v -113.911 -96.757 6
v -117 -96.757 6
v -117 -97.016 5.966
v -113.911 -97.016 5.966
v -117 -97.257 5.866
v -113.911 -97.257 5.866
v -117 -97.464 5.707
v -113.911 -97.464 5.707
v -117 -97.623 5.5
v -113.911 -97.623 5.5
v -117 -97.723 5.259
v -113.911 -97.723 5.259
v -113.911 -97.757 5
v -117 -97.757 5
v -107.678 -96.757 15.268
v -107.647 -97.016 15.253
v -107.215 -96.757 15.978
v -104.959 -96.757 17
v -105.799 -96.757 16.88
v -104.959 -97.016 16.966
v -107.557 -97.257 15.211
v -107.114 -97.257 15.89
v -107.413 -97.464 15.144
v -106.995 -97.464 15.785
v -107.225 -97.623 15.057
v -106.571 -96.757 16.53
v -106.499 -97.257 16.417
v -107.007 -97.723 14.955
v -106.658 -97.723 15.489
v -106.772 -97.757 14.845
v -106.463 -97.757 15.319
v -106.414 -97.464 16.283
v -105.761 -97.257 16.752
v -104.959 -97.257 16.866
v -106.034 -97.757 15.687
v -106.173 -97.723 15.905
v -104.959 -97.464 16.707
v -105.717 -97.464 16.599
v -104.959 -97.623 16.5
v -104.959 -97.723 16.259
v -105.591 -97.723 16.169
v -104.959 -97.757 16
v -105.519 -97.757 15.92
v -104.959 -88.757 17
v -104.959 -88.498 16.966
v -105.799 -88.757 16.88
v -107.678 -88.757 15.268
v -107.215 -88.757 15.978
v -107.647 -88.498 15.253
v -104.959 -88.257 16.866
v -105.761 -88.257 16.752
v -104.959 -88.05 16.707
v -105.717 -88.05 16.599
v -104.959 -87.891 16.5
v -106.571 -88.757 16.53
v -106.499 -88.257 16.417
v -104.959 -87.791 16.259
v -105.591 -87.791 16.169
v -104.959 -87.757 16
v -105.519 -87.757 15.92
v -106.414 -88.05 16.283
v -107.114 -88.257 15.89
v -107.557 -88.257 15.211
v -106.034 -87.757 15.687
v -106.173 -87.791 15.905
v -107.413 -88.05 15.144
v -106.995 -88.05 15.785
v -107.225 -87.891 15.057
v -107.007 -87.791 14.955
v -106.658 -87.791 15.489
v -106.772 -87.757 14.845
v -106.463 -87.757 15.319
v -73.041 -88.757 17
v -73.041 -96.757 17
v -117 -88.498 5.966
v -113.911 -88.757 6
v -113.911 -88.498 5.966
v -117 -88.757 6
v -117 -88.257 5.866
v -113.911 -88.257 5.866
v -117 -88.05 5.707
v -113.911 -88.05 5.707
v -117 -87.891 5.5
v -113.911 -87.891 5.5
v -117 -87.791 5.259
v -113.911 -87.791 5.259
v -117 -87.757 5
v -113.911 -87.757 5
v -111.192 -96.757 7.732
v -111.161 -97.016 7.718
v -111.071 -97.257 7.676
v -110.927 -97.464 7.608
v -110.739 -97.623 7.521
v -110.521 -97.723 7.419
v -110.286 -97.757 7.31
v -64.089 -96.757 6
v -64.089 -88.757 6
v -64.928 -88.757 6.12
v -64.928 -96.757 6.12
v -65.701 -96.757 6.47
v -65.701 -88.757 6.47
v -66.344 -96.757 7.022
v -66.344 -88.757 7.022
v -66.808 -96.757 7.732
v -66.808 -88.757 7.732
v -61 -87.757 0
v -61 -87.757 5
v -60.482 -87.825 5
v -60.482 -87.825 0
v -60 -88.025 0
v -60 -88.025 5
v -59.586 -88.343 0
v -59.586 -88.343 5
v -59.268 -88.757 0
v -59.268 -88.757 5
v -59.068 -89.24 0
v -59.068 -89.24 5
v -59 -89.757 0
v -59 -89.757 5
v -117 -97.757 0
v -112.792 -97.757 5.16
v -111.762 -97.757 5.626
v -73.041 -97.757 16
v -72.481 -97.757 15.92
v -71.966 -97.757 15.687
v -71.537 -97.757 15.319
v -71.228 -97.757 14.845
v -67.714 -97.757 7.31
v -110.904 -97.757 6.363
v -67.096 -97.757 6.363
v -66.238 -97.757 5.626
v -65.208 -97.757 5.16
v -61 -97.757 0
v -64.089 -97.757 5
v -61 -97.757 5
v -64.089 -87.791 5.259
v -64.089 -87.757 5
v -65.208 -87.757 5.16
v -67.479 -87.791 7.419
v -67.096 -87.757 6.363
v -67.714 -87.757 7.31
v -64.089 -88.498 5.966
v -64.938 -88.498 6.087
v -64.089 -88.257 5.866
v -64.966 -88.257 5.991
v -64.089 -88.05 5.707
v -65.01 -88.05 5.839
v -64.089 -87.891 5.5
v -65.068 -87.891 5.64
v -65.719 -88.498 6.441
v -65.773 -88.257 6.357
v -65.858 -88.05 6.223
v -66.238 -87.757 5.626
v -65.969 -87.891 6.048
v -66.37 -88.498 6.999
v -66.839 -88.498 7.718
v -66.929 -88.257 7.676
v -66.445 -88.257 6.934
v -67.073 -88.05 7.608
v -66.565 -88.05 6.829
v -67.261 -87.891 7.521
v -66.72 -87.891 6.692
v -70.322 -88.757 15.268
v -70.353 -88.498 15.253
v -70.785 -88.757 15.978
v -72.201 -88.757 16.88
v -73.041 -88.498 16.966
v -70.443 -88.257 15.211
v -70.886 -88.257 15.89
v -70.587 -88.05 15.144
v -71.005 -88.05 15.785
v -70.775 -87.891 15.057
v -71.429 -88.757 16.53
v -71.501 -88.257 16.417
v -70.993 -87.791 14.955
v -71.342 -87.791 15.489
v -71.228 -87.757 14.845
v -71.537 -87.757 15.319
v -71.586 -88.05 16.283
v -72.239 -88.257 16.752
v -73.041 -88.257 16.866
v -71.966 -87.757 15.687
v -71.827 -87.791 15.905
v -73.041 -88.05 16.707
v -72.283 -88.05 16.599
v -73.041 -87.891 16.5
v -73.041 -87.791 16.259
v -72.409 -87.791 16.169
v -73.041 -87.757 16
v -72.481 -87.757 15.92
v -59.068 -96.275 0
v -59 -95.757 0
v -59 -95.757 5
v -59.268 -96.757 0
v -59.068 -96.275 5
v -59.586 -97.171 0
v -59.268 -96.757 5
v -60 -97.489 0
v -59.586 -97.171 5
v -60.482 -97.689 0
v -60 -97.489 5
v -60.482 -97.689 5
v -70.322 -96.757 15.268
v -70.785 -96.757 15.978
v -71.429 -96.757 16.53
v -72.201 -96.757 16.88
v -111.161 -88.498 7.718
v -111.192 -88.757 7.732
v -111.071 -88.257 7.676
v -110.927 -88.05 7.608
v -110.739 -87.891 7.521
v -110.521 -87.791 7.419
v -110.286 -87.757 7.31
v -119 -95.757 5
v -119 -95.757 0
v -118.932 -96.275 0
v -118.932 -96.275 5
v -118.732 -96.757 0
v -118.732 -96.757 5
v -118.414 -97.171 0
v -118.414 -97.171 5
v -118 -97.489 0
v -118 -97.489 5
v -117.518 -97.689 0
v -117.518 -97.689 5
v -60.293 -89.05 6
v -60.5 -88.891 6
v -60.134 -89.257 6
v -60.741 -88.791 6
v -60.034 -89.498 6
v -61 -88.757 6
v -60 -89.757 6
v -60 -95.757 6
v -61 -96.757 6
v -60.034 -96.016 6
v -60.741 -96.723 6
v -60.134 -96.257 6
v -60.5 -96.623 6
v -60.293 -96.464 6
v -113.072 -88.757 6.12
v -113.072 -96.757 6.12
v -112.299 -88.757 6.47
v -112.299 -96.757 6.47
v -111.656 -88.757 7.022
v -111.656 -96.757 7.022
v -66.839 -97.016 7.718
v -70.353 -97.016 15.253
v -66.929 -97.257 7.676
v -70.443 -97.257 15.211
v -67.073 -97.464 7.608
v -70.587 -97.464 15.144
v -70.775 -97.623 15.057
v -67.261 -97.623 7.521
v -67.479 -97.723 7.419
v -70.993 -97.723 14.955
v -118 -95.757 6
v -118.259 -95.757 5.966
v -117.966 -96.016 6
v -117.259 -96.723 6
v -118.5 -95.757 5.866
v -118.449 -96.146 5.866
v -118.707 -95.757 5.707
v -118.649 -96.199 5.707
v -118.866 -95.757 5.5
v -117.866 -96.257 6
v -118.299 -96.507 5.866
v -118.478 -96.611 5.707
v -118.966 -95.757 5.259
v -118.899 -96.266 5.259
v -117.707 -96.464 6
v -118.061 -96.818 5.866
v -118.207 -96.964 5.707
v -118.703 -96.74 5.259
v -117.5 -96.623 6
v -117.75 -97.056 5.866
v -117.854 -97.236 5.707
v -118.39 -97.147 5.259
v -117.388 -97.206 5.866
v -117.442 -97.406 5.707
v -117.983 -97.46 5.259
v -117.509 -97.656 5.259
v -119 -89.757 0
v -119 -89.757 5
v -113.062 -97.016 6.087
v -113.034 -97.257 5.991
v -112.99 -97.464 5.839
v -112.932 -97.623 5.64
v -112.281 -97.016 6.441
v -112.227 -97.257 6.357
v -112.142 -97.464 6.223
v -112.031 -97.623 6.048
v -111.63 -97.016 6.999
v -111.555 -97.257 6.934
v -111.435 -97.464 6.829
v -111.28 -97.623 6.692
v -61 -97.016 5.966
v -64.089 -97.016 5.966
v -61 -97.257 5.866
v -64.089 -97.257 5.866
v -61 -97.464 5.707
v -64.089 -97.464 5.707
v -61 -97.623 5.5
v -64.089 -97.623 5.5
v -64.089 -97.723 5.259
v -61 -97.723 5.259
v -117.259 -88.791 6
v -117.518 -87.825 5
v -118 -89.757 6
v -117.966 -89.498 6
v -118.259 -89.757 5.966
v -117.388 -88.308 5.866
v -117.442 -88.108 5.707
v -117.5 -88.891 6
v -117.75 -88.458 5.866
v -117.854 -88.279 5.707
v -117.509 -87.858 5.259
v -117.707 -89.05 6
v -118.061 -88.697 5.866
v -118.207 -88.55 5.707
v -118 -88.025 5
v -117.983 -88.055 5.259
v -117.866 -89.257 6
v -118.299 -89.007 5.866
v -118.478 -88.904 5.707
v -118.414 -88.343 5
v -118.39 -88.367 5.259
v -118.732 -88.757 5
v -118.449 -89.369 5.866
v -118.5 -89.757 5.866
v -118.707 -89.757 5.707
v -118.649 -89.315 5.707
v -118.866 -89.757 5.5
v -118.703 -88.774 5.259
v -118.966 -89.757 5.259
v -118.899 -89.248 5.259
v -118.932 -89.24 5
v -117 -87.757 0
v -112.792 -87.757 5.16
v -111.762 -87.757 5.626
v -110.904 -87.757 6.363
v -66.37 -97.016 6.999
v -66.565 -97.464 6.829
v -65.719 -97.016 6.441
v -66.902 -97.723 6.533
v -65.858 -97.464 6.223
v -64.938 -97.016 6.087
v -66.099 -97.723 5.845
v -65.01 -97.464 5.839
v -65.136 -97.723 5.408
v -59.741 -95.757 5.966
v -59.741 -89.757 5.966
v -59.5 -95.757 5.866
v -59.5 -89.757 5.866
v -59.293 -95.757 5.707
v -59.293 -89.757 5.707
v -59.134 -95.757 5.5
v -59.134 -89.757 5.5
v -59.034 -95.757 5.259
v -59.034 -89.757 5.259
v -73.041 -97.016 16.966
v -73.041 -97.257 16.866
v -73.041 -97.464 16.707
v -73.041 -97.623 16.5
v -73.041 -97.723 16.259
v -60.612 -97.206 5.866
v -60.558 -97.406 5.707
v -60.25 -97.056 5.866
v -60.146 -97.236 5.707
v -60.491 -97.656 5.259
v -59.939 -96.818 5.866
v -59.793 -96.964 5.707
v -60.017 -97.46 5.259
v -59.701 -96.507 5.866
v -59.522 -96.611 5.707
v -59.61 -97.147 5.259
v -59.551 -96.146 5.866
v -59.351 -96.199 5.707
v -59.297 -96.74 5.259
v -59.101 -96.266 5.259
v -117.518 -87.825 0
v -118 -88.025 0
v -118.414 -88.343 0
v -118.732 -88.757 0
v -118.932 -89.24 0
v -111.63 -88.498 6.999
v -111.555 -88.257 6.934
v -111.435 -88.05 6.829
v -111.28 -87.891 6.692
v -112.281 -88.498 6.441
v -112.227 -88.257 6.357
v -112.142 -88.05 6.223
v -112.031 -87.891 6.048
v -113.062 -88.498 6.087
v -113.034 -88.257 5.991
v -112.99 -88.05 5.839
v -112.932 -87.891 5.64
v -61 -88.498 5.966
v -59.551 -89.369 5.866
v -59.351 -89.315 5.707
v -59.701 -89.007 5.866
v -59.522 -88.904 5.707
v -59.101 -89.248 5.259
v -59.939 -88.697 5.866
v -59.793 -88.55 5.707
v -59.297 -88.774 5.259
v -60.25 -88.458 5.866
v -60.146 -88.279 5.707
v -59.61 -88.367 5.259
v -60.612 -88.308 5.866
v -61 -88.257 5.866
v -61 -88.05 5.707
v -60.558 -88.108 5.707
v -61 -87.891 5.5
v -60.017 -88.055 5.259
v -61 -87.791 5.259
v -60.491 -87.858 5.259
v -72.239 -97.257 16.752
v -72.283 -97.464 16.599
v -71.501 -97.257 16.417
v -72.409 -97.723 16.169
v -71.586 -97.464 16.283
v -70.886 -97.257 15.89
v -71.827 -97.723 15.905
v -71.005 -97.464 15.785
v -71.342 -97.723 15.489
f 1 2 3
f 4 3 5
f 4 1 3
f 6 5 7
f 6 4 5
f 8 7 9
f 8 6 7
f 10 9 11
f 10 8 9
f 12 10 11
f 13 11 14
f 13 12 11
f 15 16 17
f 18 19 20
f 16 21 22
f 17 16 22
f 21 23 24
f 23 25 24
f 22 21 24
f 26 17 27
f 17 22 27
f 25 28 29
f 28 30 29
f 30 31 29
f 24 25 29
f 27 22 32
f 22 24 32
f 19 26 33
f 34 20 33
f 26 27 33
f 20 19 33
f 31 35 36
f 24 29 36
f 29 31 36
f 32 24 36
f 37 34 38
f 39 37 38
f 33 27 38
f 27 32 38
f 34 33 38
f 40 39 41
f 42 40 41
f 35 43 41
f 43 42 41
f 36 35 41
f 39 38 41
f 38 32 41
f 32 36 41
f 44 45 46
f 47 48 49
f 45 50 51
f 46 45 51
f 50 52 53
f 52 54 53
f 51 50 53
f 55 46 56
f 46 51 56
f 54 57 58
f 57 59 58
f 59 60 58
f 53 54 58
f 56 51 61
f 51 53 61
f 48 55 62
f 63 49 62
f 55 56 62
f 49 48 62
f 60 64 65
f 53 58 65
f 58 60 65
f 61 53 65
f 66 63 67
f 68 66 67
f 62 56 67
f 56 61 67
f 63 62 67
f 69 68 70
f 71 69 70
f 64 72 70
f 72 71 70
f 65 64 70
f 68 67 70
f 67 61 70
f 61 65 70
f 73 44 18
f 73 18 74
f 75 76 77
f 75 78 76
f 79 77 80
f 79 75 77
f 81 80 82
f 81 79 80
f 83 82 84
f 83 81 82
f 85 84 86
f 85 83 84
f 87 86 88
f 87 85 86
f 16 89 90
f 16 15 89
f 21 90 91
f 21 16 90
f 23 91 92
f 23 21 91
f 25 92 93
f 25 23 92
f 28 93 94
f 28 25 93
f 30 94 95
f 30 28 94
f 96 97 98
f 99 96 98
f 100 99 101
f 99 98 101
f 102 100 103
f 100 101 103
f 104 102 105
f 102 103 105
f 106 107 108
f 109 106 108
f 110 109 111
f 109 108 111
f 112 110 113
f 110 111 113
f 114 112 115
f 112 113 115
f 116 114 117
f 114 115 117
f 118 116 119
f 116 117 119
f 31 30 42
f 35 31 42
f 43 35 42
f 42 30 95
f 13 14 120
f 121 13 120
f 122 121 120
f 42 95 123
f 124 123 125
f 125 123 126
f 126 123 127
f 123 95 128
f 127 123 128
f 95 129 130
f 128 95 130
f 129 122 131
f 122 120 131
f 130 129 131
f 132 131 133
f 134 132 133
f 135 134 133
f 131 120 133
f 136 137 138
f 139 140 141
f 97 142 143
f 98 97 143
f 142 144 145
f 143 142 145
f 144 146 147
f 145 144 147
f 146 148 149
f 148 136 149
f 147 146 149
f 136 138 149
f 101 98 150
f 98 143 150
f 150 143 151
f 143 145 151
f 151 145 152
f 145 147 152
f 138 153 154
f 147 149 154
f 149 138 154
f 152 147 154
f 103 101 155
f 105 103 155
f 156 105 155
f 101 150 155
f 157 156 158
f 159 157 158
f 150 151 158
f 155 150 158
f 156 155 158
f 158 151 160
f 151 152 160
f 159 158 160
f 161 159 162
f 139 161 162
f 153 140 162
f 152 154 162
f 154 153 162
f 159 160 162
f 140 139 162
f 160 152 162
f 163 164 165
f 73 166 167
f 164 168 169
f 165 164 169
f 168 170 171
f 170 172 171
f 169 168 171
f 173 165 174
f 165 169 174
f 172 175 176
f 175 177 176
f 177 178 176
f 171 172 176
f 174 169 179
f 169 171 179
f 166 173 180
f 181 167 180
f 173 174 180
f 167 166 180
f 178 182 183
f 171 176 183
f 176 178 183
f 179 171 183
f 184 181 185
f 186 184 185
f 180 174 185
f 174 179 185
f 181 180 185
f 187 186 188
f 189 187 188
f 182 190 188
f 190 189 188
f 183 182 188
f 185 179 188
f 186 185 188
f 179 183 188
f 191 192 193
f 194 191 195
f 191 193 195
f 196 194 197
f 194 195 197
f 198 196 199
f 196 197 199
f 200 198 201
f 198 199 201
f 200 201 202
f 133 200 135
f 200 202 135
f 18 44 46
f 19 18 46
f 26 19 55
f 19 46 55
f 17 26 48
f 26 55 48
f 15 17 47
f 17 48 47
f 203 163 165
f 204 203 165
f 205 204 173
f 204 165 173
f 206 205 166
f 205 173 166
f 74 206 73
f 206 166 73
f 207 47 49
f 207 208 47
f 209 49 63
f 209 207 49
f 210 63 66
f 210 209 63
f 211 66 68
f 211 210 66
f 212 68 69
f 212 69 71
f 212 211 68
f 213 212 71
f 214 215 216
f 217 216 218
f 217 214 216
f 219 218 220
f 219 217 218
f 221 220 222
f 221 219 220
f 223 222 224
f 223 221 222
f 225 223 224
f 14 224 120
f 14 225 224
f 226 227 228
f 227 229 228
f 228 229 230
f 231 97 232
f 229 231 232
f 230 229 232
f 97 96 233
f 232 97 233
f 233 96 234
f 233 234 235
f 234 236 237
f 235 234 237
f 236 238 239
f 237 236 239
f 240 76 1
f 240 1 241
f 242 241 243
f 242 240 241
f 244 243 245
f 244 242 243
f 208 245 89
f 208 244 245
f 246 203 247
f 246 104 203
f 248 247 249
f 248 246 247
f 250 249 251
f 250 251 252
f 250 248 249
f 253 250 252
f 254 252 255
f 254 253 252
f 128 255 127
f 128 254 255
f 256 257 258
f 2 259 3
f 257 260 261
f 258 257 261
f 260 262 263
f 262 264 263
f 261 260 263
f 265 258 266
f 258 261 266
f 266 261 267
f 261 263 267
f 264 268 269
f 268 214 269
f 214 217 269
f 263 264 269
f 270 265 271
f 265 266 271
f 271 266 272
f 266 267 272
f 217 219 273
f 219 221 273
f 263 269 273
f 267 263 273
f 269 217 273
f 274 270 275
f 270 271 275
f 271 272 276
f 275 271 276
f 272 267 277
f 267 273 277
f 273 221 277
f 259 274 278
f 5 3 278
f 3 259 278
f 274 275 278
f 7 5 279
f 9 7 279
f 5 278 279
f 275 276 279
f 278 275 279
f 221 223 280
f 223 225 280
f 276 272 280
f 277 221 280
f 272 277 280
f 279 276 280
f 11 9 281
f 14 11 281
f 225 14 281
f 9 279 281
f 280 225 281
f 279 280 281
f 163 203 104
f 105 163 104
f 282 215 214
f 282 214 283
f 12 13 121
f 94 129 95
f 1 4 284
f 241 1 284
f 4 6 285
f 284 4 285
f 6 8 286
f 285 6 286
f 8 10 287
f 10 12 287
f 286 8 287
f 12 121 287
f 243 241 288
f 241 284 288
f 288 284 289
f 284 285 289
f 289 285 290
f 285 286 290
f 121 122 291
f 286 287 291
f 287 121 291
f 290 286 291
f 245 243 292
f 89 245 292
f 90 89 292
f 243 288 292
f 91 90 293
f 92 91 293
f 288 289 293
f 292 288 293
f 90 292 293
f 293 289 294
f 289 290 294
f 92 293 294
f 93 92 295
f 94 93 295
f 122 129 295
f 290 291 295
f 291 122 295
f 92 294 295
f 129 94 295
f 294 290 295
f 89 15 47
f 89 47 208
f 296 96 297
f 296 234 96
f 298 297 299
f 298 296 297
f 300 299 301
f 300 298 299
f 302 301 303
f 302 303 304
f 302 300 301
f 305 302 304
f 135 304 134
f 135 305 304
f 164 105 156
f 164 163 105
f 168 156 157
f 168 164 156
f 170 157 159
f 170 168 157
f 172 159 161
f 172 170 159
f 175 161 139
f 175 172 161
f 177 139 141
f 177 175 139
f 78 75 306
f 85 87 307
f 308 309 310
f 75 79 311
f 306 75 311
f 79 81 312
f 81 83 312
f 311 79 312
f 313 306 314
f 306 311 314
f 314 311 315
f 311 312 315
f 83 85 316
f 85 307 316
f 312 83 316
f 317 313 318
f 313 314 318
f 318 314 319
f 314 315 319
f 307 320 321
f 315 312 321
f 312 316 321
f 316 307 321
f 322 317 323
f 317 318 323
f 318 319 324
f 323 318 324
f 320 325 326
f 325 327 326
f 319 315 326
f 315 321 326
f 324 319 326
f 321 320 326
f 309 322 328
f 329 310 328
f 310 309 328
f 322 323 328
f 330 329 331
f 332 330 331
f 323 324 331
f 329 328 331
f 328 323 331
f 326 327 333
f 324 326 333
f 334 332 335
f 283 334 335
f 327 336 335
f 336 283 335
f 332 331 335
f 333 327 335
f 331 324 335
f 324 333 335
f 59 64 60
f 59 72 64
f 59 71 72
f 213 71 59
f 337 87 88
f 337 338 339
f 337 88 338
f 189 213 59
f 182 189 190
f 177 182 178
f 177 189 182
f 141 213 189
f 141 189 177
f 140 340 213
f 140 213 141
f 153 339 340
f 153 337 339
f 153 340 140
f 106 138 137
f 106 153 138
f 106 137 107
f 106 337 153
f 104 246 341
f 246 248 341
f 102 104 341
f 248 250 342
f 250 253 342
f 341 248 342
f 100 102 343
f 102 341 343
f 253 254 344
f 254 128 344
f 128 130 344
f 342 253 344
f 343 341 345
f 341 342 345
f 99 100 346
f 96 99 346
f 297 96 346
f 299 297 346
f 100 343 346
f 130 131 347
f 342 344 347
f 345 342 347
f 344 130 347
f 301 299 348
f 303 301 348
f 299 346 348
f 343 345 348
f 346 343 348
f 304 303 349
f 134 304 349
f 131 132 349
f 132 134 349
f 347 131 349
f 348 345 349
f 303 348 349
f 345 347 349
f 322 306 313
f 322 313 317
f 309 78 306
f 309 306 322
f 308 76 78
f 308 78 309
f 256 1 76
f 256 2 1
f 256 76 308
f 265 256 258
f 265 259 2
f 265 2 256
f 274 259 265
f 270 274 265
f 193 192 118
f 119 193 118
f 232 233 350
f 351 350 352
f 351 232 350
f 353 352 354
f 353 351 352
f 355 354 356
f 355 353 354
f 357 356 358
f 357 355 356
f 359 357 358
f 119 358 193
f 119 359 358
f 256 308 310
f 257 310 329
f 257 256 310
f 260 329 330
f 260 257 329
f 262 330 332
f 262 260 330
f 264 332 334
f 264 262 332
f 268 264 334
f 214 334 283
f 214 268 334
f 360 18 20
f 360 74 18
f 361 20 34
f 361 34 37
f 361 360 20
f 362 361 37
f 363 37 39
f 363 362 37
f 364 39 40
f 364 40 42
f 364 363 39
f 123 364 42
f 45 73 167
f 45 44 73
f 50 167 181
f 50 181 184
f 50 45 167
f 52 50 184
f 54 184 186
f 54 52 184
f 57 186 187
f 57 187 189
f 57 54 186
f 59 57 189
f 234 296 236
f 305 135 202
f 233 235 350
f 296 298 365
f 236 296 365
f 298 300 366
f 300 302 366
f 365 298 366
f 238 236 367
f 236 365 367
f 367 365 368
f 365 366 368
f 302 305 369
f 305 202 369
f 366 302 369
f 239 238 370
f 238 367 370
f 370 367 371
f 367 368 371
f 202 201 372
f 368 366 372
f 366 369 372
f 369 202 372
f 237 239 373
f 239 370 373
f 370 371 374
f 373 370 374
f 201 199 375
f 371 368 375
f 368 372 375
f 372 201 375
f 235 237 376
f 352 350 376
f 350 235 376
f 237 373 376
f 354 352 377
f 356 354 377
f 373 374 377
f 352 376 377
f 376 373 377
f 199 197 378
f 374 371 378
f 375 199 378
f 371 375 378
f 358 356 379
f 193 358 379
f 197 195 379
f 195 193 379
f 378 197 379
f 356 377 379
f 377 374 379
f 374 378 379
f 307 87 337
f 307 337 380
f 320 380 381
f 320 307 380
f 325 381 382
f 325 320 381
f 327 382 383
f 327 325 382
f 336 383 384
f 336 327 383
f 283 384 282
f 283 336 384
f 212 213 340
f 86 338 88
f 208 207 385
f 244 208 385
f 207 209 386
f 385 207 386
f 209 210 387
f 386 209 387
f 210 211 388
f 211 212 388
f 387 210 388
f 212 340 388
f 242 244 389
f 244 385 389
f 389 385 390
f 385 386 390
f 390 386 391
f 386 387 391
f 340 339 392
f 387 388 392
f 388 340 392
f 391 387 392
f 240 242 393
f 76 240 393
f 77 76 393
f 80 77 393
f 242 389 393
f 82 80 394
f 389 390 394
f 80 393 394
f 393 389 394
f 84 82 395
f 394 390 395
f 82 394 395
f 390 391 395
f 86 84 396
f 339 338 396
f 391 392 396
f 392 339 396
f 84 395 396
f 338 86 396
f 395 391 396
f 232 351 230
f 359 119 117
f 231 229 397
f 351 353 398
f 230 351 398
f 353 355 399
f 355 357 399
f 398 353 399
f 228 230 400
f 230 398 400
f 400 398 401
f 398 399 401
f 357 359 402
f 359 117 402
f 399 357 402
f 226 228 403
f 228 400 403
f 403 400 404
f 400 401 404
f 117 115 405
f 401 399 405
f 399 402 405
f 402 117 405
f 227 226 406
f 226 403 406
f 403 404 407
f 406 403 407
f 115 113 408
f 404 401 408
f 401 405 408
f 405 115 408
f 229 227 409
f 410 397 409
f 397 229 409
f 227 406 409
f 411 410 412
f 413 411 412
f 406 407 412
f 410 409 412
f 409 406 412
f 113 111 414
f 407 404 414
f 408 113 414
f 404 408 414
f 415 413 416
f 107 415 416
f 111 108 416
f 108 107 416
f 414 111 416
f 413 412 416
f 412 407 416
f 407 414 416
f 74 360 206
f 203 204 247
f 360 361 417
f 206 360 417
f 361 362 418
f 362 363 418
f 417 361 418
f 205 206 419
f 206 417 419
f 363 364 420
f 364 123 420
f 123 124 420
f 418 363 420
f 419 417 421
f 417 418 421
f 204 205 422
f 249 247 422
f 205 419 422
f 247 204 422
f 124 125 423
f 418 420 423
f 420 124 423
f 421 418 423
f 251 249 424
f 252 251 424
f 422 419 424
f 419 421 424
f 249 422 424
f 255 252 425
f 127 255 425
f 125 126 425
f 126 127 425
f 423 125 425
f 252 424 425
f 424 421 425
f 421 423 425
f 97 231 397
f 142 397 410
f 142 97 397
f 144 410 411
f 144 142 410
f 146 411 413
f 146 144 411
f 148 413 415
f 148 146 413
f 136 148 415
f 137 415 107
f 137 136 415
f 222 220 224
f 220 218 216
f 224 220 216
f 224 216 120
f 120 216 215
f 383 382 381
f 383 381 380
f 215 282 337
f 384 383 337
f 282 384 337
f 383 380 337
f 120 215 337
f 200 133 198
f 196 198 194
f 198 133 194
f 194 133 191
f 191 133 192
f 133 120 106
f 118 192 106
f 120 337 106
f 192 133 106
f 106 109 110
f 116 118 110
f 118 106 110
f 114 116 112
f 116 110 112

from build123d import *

# Parameters (mm, degrees)
SKETCH1_W           = 60
SKETCH1_H           = 10
BOSS_EXTRUDE1_DEPTH = 17
CUT_EXTRUDE1_REACH  = 12
FILLET1_R           = 3
FILLET2_R           = 2
FILLET3_R           = 1


with BuildPart() as part:
    # Sketch1 → Boss-Extrude1 (new body)
    with BuildSketch(Plane.XY):
        with Locations((-89, -92.757283518)):
            Rectangle(SKETCH1_W, SKETCH1_H)
    extrude(amount=BOSS_EXTRUDE1_DEPTH)

    # Sketch2 → Cut-Extrude1 (cut, up to next)
    with BuildSketch(Plane.XZ.offset(97.757283518), mode=Mode.PRIVATE) as cut_extrude1_sk1:
        Polygon((-106.87061576, 17), (-112, 6), (-119, 6), (-119, 17), align=None)
    cut_extrude1_tool1 = extrude(cut_extrude1_sk1.sketch, amount=-CUT_EXTRUDE1_REACH, mode=Mode.PRIVATE) & part.part
    add(cut_extrude1_tool1.solids().sort_by_distance((-114.103037, -97.757284, 11.991593))[0], mode=Mode.SUBTRACT)
    # Sketch2 → Cut-Extrude1 (cut, up to next)
    with BuildSketch(Plane.XZ.offset(97.757283518), mode=Mode.PRIVATE) as cut_extrude1_sk2:
        Polygon((-59, 17), (-71.12938424, 17), (-66, 6), (-59, 6), align=None)
    cut_extrude1_tool2 = extrude(cut_extrude1_sk2.sketch, amount=-CUT_EXTRUDE1_REACH, mode=Mode.PRIVATE) & part.part
    add(cut_extrude1_tool2.solids().sort_by_distance((-63.896963, -97.757284, 11.991593))[0], mode=Mode.SUBTRACT)

    # Fillet1
    fillet1_edges = [part.edges().sort_by_distance(p)[0] for p in [
        (-66, -92.757283518, 6),
        (-71.12938424, -92.757283518, 17),
        (-106.87061576, -92.757283518, 17),
        (-112, -92.757283518, 6),
    ]]
    fillet(fillet1_edges, radius=FILLET1_R)

    # Fillet2
    fillet2_edges = [part.edges().sort_by_distance(p)[0] for p in [
        (-59, -97.757283518, 3),
        (-119, -97.757283518, 3),
        (-59, -87.757283518, 3),
        (-119, -87.757283518, 3),
    ]]
    fillet(fillet2_edges, radius=FILLET2_R)

    # Fillet3
    fillet3_edges = [part.edges().sort_by_distance(p)[0] for p in [
        (-62.544394609, -97.757283518, 6),
        (-65.700688043, -97.757283518, 6.469825663),
        (-68.56469212, -97.757283518, 11.5),
        (-71.428696197, -97.757283518, 16.530174337),
        (-115.455605391, -97.757283518, 6),
        (-89, -97.757283518, 17),
        (-112.299311957, -97.757283518, 6.469825663),
        (-106.571303803, -97.757283518, 16.530174337),
        (-109.43530788, -97.757283518, 11.5),
        (-59.585786438, -97.171497081, 6),
        (-59, -92.757283518, 6),
        (-62.544394609, -87.757283518, 6),
        (-59.585786438, -88.343069955, 6),
        (-65.700688043, -87.757283518, 6.469825663),
        (-68.56469212, -87.757283518, 11.5),
        (-118.414213562, -97.171497081, 6),
        (-71.428696197, -87.757283518, 16.530174337),
        (-119, -92.757283518, 6),
        (-115.455605391, -87.757283518, 6),
        (-118.414213562, -88.343069955, 6),
        (-89, -87.757283518, 17),
        (-112.299311957, -87.757283518, 6.469825663),
        (-106.571303803, -87.757283518, 16.530174337),
        (-109.43530788, -87.757283518, 11.5),
    ]]
    fillet(fillet3_edges, radius=FILLET3_R)


solid = part.part
